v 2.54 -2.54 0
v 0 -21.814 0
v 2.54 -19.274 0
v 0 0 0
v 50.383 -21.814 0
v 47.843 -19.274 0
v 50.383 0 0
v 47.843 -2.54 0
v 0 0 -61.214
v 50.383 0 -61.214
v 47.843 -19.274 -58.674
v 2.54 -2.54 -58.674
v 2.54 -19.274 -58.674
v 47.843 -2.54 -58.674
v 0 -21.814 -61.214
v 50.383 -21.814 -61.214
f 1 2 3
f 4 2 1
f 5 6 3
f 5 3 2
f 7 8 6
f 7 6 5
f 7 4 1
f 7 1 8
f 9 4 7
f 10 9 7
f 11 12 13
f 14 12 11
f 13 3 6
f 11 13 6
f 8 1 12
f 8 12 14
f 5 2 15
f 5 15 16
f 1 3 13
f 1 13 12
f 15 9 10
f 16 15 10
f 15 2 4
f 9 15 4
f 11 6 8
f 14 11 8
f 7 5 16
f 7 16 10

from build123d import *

# Parameters (mm, degrees)
F0_W     = 50.382692
F0_H     = 21.813512
F1_DEPTH = 61.214
F2_T     = -2.54


with BuildPart() as f1:
    # F0 (on Top) → F1 (new body)
    with BuildSketch(Plane.XY):
        with Locations((25.191346, -10.906756)):
            Rectangle(F0_W, F0_H)
    extrude(amount=-F1_DEPTH)

    # F2
    f2_openings = [f1.faces().sort_by_distance(p)[0] for p in [
        (25.191346, -10.906756, 0),
    ]]
    offset(amount=F2_T, openings=f2_openings)


solid = f1.part
